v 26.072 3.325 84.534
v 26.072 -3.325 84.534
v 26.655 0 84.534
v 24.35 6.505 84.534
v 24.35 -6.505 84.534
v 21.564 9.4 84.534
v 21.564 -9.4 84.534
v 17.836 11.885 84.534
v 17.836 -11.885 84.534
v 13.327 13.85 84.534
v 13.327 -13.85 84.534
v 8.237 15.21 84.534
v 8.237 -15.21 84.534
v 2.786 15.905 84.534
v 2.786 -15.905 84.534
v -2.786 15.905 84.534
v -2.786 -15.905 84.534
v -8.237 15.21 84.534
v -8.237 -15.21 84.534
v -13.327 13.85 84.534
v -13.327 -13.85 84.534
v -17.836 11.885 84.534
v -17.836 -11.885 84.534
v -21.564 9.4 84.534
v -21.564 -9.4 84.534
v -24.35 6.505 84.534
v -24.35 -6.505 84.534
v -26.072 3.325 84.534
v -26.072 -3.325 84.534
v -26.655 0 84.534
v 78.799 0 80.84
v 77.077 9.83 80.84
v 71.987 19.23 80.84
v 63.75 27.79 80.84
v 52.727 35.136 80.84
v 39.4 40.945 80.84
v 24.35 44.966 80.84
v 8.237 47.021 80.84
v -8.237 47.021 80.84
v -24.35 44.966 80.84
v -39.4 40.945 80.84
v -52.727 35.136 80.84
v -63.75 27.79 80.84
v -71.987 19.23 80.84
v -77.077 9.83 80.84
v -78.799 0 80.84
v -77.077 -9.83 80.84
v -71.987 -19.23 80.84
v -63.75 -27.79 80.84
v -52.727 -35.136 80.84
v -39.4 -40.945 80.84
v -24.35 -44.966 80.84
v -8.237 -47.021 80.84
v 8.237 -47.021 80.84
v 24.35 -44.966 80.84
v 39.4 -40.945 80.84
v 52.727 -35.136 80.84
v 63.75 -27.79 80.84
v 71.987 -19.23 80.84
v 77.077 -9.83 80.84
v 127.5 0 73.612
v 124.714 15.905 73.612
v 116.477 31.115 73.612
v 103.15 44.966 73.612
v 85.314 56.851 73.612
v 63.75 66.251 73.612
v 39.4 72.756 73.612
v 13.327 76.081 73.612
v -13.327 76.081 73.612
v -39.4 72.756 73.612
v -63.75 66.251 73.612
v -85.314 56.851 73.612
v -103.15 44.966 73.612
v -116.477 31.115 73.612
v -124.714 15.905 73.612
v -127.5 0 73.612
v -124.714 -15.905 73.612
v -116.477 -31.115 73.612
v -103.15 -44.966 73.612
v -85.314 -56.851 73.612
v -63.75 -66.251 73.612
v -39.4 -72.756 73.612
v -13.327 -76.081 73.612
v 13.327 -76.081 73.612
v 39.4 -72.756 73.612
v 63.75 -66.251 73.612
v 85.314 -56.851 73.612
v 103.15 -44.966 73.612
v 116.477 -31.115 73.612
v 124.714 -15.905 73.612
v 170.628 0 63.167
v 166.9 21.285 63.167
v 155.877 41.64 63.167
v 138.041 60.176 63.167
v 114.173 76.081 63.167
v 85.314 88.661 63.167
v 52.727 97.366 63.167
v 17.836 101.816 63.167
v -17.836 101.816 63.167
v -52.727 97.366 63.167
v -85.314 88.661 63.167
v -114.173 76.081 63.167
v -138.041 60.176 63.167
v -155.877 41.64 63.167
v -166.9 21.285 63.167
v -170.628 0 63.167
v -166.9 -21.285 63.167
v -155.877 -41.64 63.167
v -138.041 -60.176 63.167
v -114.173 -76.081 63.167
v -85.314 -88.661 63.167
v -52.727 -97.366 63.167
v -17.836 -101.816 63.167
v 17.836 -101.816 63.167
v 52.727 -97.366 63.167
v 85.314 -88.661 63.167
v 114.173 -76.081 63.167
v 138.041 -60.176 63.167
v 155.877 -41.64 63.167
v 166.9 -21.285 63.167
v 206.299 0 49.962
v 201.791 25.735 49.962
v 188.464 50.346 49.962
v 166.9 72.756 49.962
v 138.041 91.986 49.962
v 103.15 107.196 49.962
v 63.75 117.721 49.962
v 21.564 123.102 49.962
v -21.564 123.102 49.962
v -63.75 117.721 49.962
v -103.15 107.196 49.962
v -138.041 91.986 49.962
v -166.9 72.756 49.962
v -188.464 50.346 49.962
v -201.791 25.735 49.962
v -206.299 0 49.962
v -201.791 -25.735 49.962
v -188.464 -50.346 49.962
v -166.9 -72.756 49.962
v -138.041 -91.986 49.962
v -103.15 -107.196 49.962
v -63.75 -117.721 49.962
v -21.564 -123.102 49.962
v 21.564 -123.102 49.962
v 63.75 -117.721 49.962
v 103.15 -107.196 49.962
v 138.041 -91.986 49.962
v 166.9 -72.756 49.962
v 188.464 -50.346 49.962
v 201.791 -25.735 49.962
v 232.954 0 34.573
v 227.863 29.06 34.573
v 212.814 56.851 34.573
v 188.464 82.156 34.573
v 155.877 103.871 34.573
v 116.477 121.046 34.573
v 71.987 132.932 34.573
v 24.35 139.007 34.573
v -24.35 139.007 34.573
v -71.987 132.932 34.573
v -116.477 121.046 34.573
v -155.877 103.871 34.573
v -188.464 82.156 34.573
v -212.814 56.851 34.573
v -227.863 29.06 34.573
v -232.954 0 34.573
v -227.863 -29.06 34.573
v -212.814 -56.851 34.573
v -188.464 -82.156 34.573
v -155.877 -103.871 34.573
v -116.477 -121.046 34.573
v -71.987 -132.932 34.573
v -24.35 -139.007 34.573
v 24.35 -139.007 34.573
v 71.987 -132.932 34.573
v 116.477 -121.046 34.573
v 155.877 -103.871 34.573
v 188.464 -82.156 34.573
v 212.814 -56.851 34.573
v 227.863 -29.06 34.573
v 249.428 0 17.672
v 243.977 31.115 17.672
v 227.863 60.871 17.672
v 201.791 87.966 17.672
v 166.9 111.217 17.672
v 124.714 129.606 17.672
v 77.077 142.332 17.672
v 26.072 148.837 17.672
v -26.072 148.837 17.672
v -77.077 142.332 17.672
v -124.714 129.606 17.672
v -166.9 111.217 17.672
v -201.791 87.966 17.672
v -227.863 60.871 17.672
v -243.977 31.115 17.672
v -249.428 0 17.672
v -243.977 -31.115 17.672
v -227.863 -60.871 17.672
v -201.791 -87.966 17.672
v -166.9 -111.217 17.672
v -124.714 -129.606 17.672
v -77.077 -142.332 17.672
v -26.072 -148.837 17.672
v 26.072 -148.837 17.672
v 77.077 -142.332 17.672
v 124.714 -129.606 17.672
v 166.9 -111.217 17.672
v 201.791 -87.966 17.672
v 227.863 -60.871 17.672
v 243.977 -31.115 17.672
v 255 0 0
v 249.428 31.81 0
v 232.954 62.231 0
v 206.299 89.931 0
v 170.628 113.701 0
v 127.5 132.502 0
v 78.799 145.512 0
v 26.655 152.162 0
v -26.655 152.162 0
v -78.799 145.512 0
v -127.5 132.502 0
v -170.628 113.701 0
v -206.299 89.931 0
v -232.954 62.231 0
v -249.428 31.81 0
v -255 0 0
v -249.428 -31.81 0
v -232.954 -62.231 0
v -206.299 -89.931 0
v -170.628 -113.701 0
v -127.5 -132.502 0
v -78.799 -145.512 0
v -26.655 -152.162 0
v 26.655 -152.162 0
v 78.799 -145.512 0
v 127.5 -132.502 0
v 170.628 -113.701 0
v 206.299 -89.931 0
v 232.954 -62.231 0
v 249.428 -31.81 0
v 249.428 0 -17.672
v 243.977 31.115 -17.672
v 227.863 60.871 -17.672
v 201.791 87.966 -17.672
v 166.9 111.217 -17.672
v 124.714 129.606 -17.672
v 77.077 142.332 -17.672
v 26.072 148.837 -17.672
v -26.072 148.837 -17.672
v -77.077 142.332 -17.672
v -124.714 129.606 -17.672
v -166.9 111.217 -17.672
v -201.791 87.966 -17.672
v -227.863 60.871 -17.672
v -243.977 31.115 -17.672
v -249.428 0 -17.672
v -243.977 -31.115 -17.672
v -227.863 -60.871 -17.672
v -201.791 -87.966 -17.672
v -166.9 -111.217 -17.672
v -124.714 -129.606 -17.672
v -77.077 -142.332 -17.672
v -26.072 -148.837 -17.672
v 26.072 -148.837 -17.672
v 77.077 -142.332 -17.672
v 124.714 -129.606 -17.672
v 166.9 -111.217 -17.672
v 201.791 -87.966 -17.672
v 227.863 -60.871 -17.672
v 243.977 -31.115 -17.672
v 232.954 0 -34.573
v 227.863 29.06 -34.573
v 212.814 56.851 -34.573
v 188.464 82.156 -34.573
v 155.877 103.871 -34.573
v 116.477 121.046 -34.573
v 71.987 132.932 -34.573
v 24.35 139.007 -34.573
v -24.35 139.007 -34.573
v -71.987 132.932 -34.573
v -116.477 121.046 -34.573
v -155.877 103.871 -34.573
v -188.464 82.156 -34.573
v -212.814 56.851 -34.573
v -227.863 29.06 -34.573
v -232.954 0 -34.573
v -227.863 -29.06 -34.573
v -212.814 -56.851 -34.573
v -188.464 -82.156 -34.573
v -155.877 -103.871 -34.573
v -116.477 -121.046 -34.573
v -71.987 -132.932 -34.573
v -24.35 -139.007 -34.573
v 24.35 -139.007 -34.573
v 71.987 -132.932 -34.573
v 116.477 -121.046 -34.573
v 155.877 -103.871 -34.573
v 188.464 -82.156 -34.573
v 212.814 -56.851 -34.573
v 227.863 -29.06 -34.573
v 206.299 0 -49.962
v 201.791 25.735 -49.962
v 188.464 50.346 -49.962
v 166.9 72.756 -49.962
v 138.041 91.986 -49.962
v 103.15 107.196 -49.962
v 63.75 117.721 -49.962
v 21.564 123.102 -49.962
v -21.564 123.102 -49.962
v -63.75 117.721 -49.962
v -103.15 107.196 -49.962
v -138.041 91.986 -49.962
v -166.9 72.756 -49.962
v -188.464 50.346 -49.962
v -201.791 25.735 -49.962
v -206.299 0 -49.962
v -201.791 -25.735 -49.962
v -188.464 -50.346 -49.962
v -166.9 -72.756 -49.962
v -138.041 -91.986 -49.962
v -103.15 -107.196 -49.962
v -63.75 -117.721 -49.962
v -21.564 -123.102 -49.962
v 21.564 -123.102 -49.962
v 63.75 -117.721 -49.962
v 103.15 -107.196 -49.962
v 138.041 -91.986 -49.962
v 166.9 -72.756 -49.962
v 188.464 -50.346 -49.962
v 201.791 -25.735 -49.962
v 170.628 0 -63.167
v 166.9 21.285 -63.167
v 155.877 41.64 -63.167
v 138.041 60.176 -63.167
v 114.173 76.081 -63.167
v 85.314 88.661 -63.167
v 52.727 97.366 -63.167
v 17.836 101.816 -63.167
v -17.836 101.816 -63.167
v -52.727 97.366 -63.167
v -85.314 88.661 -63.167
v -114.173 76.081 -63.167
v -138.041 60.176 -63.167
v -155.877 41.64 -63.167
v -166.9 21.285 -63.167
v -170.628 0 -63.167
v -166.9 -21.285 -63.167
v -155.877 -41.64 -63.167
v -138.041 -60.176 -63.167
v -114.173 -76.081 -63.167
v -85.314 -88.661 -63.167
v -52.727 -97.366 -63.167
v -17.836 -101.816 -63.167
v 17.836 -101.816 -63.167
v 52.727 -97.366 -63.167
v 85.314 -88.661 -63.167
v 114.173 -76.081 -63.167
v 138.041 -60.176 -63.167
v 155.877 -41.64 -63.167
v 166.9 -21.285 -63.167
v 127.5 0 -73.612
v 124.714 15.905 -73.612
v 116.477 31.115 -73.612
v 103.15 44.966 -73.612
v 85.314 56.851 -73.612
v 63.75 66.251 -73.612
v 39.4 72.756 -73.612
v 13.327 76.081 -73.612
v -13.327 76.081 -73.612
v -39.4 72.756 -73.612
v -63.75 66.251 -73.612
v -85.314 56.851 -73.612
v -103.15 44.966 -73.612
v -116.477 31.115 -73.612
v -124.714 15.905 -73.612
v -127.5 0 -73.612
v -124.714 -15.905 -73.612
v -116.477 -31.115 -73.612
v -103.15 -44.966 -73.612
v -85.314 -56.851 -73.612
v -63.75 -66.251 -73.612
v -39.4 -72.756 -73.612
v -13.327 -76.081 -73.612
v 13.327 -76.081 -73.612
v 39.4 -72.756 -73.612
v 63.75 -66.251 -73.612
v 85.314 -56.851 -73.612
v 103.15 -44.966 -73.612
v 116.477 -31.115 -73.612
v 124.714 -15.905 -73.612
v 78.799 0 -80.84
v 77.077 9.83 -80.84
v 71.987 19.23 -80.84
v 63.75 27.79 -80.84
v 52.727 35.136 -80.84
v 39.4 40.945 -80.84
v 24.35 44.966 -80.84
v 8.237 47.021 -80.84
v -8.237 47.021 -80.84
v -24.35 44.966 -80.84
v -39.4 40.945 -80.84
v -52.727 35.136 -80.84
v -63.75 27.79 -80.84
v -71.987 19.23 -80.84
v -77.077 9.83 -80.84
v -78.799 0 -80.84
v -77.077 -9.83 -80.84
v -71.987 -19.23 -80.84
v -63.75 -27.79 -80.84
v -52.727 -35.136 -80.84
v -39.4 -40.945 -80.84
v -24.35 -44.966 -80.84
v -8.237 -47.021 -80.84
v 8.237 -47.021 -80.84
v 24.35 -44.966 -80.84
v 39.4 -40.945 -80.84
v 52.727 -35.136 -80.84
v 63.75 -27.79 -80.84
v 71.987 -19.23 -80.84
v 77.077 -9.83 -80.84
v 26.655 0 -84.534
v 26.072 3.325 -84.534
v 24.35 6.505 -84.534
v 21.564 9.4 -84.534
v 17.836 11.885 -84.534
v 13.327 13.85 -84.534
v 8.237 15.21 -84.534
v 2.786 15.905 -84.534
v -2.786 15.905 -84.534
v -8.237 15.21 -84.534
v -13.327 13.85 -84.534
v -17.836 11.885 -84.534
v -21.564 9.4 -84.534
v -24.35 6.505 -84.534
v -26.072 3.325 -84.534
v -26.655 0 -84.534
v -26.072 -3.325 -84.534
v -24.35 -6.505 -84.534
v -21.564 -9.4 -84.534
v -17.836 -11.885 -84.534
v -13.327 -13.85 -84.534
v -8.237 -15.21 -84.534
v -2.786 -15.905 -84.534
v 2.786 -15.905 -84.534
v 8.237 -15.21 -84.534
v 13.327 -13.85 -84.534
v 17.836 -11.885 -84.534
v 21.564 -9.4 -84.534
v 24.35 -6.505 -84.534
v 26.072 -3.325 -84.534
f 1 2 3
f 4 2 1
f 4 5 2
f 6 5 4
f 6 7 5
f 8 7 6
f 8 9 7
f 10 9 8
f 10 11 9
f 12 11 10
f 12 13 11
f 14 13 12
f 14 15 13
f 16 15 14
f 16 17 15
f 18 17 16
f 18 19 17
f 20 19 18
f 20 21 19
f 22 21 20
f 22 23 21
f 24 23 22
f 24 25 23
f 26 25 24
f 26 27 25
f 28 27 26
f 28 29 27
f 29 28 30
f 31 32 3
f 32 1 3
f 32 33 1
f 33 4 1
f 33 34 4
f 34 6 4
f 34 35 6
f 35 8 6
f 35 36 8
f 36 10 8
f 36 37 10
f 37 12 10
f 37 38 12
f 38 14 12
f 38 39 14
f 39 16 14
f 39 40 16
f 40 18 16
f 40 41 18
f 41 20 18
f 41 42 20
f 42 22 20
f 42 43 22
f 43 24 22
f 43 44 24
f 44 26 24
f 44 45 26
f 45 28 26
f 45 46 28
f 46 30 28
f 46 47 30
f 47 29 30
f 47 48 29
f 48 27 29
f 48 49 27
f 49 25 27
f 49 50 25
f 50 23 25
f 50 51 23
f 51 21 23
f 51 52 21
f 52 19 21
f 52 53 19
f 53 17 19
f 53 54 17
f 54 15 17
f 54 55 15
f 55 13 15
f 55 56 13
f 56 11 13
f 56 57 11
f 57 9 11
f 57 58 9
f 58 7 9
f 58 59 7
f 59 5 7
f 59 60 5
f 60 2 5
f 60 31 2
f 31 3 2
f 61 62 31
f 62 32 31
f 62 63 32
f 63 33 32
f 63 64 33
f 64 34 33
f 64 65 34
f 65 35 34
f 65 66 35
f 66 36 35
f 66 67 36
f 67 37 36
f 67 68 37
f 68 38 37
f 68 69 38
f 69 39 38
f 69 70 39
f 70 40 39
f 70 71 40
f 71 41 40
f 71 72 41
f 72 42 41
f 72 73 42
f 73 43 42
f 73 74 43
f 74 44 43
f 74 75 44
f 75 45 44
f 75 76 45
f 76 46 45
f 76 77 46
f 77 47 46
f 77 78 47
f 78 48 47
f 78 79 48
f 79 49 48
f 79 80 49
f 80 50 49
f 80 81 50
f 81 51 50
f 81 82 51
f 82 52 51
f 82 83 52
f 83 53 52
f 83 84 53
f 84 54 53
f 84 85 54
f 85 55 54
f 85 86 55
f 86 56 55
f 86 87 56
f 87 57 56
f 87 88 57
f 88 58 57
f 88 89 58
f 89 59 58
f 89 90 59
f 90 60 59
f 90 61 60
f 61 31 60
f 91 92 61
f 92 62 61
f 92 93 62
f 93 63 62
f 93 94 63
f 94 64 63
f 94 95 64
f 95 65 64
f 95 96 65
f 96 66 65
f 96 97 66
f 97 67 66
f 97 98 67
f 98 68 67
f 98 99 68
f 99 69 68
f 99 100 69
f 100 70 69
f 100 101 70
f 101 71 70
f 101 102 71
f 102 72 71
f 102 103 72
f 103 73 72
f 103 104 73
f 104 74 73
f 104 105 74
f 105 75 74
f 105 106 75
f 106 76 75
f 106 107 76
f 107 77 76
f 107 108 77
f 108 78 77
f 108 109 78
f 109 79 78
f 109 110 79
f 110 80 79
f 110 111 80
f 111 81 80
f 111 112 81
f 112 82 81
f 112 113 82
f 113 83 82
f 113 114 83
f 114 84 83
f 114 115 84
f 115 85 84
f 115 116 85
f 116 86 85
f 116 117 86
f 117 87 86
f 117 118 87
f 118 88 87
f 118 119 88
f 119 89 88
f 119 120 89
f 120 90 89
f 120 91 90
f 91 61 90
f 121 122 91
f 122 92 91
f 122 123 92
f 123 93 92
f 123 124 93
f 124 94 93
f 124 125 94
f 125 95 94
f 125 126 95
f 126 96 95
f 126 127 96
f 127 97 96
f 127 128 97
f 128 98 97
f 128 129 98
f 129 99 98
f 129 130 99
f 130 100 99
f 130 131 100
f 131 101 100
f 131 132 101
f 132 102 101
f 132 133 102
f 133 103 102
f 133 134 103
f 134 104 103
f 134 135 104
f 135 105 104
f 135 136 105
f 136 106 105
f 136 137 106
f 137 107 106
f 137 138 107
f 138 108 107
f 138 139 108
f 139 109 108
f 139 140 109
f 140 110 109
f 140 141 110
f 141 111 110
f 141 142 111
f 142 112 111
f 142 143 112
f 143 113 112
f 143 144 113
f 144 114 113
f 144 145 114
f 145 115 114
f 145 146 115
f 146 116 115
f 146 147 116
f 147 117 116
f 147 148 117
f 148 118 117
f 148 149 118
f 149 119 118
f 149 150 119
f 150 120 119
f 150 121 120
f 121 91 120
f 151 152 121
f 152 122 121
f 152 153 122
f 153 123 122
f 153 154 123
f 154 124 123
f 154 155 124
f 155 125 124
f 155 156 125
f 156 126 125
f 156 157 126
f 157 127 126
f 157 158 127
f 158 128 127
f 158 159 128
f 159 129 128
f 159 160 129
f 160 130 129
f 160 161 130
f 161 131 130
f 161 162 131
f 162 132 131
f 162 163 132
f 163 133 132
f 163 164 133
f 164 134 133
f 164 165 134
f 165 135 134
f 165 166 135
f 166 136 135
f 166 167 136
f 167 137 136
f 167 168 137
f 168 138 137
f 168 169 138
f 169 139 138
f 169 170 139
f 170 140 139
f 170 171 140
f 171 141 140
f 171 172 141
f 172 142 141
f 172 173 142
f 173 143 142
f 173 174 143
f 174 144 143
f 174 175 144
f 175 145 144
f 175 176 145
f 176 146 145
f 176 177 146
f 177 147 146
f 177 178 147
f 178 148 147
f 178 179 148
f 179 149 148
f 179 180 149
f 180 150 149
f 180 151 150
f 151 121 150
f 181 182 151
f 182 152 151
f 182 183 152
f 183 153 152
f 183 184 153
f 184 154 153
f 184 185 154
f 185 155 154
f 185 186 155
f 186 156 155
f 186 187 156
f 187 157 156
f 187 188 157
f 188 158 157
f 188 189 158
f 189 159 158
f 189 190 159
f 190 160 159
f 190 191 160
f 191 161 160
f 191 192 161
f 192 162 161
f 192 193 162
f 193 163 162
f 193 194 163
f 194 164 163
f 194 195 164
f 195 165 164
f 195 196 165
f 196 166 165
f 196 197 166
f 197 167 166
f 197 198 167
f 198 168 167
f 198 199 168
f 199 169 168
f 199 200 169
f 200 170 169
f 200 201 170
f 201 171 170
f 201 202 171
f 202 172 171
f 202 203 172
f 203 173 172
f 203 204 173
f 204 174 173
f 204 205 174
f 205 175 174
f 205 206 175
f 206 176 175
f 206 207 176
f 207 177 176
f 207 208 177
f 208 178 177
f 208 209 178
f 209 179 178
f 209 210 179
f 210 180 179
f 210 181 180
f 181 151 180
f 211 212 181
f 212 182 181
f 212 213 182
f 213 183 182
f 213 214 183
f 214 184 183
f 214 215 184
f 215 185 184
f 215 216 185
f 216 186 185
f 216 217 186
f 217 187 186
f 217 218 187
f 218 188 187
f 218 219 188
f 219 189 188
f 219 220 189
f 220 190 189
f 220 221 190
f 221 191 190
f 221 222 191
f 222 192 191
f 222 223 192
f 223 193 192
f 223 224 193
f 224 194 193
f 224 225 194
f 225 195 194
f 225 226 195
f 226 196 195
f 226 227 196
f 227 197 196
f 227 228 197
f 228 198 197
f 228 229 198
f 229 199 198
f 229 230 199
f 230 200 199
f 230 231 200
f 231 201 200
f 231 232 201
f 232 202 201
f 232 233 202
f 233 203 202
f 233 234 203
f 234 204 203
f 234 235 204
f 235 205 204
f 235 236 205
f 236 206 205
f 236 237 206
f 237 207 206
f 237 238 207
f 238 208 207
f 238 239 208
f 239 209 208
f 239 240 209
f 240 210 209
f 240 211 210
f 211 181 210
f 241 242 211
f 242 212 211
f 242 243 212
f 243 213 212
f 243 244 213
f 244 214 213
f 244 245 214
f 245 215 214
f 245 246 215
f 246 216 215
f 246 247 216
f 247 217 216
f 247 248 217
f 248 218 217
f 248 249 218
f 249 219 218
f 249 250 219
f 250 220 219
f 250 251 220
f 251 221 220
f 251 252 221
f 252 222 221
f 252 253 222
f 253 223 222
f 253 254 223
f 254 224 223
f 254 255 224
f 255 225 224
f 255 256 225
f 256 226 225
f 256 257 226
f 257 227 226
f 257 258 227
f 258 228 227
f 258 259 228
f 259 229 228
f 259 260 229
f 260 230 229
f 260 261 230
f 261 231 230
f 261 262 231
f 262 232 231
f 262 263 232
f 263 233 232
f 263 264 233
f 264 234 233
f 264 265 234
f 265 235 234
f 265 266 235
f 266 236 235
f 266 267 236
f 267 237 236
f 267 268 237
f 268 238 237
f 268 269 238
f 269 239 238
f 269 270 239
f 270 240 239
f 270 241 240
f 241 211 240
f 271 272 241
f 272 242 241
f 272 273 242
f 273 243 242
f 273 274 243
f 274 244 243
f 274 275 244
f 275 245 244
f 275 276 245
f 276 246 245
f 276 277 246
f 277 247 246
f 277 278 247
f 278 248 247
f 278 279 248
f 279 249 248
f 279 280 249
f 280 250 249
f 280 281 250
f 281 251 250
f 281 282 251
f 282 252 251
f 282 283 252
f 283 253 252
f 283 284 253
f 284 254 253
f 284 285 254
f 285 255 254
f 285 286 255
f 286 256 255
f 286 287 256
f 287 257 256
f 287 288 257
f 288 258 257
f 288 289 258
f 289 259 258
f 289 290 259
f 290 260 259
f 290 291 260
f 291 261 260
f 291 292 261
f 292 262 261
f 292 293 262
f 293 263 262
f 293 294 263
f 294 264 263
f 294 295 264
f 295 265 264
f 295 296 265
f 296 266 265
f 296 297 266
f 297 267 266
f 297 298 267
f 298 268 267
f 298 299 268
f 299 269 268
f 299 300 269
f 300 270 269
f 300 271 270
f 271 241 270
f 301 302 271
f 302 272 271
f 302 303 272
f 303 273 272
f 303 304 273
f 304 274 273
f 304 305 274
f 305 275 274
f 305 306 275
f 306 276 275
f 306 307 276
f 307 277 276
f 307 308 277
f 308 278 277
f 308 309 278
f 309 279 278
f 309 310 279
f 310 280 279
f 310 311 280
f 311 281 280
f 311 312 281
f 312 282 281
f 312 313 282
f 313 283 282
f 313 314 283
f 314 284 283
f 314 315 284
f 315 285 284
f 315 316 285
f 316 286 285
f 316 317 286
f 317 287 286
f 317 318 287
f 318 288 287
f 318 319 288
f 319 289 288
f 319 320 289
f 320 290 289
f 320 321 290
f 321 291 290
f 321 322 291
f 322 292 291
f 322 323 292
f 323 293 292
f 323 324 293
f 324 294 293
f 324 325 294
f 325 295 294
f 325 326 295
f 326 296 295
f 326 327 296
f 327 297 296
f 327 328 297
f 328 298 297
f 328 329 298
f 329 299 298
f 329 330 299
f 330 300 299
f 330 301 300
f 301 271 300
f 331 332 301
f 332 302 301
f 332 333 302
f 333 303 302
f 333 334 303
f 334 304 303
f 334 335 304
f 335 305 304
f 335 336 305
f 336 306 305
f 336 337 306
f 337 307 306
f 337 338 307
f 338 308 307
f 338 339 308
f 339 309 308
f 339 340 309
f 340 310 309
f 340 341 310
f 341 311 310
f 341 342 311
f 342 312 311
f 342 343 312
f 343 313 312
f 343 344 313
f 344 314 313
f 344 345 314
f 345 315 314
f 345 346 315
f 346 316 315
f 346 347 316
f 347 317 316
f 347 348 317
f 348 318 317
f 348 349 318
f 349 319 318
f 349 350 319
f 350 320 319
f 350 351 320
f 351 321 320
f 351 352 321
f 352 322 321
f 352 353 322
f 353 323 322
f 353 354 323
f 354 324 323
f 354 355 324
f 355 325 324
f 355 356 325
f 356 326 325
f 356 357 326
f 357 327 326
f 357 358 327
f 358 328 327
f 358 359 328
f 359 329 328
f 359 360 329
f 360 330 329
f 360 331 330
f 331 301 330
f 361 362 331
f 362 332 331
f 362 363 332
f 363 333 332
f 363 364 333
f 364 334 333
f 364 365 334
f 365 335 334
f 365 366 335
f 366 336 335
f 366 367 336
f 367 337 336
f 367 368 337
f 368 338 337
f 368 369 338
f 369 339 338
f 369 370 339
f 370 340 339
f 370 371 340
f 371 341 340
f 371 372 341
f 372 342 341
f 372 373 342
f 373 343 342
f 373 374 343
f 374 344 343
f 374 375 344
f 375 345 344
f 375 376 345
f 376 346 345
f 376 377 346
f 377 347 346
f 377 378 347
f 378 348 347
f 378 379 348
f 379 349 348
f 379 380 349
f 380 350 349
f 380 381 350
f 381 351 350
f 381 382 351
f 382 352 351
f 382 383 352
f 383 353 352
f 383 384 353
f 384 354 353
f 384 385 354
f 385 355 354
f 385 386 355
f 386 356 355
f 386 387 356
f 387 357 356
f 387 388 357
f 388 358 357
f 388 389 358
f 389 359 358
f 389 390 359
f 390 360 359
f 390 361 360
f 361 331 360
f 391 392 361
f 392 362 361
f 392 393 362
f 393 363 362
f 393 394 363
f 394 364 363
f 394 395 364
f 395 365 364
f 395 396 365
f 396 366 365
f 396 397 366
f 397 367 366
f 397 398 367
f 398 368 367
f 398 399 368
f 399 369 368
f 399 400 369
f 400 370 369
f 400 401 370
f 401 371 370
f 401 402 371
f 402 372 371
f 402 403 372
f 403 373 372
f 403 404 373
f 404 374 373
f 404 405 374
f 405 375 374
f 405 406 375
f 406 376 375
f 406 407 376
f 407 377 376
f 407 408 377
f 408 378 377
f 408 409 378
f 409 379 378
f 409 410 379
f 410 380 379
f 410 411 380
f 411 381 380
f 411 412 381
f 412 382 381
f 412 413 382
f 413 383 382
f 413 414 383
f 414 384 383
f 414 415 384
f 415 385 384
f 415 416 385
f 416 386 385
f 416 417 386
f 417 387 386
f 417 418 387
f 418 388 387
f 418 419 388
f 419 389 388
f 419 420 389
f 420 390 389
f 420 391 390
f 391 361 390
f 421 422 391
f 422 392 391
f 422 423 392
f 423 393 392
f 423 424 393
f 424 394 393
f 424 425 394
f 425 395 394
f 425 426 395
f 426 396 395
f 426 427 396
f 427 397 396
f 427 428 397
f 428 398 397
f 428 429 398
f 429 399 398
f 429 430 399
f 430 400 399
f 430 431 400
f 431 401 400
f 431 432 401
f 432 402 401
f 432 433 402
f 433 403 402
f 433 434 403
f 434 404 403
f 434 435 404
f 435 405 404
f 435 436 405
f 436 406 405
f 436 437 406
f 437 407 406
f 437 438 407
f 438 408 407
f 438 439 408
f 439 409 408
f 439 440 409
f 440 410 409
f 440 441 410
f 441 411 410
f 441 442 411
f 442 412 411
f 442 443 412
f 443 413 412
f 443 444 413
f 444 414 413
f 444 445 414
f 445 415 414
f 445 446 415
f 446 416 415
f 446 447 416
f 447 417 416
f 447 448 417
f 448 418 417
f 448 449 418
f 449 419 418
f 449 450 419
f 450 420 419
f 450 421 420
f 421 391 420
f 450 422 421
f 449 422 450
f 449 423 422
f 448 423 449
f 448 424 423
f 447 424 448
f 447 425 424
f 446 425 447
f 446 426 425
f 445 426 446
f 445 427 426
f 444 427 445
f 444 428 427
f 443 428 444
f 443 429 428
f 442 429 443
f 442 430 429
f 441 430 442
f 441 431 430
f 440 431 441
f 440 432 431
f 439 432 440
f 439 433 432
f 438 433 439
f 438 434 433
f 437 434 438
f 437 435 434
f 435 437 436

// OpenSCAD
// Generated by SolidPython 1.0.1 on 2020-07-29 00:46:51


scale(v = [15, 9, 5]) {
	sphere(r = 17);
}
/***********************************************
*********      SolidPython code:      **********
************************************************
 
# import packages: SolidPython
from solid import *
from solid.utils import *
from itertools import chain, combinations, permutations


class Resize:

    def __init__(self, scad_file):
        self.scad_file = scad_file
        #self.scad_file = import_scad(scad_file)
        # cone/cylinder param:
        self.r1 = 0
        self.r2 = 0
        self.h = 0
        # rectangular prism param:
        self.w = 0
        self.l = 0
        # ellipse param:
        self.r = 0

    # import OpenScad code (file name corresponds to shape)


    # classify shape + parameters
    def assign(self, param1, param2, param3):
        if self.scad_file == 'cone.scad':
            self.r1 = param1
            self.r2 = param2
            self.h = param3
        elif self.scad_file == 'cylinder.scad':
            self.r1 = param1
            self.r2 = param2
            self.h = param3
        elif self.scad_file == 'rectangularPrism.scad':
            self.h = param1
            self.l = param2
            self.w = param3
        else:
            self.r = param1
            self.h = param2

    # resize parameters
    def iterate(self):
        x = range(3, 20, 2)
        i = 1
        if self.scad_file == 'cone.scad':
            tempList = list(permutations(x, 2))
            for temp in tempList:
                param1 = temp[0]
                param2 = temp[1]
                filepath = 'produced_scad_files/' + 'cone' + str(param1) + '_' + str(param2) + '_' + '.scad'
                scad_render_to_file(cylinder(h=param1, r1=param2, r2=0), filepath)

        elif self.scad_file == 'cylinder.scad':
            tempList = list(permutations(x, 3))
            for temp in tempList:
                param1 = temp[0]
                param2 = temp[1]
                filepath = 'produced_scad_files/' + 'cylinder' + str(param1) + '_' + str(param2) + '_' + '.scad'
                scad_render_to_file(cylinder(h=param1, r1=param2, r2=param2), filepath)

        elif self.scad_file == 'rectangularPrism.scad':
            tempList = list(permutations(x, 3))
            for temp in tempList:
                param1 = temp[0]
                param2 = temp[1]
                param3 = temp[2]
                filepath = 'produced_scad_files/' + 'rectangularPrism' + str(param1) + '_' + str(param2) + '_' + str(
                    param3) + '.scad'
                scad_render_to_file(cube(size=(param1, param2, param3)), filepath)

        elif self.scad_file == 'ellipse.scad':
            tempList = list(permutations(x, 4))
            for temp in tempList:
                param1 = temp[0]
                param2 = temp[1]
                param3 = temp[2]
                param4 = temp[3]
                filepath = 'produced_scad_files/' + 'ellipse' + str(param1) + '_' + str(param2) + '_' + str(param3) + '_' + str(param4) + '.scad'
                scad_render_to_file(scale([param1, param2, param3])(sphere(r=param4)), filepath)

    def render_to_scadfile(self):
        scad_render_to_file(scad, 'example.scad') 
 
************************************************/
